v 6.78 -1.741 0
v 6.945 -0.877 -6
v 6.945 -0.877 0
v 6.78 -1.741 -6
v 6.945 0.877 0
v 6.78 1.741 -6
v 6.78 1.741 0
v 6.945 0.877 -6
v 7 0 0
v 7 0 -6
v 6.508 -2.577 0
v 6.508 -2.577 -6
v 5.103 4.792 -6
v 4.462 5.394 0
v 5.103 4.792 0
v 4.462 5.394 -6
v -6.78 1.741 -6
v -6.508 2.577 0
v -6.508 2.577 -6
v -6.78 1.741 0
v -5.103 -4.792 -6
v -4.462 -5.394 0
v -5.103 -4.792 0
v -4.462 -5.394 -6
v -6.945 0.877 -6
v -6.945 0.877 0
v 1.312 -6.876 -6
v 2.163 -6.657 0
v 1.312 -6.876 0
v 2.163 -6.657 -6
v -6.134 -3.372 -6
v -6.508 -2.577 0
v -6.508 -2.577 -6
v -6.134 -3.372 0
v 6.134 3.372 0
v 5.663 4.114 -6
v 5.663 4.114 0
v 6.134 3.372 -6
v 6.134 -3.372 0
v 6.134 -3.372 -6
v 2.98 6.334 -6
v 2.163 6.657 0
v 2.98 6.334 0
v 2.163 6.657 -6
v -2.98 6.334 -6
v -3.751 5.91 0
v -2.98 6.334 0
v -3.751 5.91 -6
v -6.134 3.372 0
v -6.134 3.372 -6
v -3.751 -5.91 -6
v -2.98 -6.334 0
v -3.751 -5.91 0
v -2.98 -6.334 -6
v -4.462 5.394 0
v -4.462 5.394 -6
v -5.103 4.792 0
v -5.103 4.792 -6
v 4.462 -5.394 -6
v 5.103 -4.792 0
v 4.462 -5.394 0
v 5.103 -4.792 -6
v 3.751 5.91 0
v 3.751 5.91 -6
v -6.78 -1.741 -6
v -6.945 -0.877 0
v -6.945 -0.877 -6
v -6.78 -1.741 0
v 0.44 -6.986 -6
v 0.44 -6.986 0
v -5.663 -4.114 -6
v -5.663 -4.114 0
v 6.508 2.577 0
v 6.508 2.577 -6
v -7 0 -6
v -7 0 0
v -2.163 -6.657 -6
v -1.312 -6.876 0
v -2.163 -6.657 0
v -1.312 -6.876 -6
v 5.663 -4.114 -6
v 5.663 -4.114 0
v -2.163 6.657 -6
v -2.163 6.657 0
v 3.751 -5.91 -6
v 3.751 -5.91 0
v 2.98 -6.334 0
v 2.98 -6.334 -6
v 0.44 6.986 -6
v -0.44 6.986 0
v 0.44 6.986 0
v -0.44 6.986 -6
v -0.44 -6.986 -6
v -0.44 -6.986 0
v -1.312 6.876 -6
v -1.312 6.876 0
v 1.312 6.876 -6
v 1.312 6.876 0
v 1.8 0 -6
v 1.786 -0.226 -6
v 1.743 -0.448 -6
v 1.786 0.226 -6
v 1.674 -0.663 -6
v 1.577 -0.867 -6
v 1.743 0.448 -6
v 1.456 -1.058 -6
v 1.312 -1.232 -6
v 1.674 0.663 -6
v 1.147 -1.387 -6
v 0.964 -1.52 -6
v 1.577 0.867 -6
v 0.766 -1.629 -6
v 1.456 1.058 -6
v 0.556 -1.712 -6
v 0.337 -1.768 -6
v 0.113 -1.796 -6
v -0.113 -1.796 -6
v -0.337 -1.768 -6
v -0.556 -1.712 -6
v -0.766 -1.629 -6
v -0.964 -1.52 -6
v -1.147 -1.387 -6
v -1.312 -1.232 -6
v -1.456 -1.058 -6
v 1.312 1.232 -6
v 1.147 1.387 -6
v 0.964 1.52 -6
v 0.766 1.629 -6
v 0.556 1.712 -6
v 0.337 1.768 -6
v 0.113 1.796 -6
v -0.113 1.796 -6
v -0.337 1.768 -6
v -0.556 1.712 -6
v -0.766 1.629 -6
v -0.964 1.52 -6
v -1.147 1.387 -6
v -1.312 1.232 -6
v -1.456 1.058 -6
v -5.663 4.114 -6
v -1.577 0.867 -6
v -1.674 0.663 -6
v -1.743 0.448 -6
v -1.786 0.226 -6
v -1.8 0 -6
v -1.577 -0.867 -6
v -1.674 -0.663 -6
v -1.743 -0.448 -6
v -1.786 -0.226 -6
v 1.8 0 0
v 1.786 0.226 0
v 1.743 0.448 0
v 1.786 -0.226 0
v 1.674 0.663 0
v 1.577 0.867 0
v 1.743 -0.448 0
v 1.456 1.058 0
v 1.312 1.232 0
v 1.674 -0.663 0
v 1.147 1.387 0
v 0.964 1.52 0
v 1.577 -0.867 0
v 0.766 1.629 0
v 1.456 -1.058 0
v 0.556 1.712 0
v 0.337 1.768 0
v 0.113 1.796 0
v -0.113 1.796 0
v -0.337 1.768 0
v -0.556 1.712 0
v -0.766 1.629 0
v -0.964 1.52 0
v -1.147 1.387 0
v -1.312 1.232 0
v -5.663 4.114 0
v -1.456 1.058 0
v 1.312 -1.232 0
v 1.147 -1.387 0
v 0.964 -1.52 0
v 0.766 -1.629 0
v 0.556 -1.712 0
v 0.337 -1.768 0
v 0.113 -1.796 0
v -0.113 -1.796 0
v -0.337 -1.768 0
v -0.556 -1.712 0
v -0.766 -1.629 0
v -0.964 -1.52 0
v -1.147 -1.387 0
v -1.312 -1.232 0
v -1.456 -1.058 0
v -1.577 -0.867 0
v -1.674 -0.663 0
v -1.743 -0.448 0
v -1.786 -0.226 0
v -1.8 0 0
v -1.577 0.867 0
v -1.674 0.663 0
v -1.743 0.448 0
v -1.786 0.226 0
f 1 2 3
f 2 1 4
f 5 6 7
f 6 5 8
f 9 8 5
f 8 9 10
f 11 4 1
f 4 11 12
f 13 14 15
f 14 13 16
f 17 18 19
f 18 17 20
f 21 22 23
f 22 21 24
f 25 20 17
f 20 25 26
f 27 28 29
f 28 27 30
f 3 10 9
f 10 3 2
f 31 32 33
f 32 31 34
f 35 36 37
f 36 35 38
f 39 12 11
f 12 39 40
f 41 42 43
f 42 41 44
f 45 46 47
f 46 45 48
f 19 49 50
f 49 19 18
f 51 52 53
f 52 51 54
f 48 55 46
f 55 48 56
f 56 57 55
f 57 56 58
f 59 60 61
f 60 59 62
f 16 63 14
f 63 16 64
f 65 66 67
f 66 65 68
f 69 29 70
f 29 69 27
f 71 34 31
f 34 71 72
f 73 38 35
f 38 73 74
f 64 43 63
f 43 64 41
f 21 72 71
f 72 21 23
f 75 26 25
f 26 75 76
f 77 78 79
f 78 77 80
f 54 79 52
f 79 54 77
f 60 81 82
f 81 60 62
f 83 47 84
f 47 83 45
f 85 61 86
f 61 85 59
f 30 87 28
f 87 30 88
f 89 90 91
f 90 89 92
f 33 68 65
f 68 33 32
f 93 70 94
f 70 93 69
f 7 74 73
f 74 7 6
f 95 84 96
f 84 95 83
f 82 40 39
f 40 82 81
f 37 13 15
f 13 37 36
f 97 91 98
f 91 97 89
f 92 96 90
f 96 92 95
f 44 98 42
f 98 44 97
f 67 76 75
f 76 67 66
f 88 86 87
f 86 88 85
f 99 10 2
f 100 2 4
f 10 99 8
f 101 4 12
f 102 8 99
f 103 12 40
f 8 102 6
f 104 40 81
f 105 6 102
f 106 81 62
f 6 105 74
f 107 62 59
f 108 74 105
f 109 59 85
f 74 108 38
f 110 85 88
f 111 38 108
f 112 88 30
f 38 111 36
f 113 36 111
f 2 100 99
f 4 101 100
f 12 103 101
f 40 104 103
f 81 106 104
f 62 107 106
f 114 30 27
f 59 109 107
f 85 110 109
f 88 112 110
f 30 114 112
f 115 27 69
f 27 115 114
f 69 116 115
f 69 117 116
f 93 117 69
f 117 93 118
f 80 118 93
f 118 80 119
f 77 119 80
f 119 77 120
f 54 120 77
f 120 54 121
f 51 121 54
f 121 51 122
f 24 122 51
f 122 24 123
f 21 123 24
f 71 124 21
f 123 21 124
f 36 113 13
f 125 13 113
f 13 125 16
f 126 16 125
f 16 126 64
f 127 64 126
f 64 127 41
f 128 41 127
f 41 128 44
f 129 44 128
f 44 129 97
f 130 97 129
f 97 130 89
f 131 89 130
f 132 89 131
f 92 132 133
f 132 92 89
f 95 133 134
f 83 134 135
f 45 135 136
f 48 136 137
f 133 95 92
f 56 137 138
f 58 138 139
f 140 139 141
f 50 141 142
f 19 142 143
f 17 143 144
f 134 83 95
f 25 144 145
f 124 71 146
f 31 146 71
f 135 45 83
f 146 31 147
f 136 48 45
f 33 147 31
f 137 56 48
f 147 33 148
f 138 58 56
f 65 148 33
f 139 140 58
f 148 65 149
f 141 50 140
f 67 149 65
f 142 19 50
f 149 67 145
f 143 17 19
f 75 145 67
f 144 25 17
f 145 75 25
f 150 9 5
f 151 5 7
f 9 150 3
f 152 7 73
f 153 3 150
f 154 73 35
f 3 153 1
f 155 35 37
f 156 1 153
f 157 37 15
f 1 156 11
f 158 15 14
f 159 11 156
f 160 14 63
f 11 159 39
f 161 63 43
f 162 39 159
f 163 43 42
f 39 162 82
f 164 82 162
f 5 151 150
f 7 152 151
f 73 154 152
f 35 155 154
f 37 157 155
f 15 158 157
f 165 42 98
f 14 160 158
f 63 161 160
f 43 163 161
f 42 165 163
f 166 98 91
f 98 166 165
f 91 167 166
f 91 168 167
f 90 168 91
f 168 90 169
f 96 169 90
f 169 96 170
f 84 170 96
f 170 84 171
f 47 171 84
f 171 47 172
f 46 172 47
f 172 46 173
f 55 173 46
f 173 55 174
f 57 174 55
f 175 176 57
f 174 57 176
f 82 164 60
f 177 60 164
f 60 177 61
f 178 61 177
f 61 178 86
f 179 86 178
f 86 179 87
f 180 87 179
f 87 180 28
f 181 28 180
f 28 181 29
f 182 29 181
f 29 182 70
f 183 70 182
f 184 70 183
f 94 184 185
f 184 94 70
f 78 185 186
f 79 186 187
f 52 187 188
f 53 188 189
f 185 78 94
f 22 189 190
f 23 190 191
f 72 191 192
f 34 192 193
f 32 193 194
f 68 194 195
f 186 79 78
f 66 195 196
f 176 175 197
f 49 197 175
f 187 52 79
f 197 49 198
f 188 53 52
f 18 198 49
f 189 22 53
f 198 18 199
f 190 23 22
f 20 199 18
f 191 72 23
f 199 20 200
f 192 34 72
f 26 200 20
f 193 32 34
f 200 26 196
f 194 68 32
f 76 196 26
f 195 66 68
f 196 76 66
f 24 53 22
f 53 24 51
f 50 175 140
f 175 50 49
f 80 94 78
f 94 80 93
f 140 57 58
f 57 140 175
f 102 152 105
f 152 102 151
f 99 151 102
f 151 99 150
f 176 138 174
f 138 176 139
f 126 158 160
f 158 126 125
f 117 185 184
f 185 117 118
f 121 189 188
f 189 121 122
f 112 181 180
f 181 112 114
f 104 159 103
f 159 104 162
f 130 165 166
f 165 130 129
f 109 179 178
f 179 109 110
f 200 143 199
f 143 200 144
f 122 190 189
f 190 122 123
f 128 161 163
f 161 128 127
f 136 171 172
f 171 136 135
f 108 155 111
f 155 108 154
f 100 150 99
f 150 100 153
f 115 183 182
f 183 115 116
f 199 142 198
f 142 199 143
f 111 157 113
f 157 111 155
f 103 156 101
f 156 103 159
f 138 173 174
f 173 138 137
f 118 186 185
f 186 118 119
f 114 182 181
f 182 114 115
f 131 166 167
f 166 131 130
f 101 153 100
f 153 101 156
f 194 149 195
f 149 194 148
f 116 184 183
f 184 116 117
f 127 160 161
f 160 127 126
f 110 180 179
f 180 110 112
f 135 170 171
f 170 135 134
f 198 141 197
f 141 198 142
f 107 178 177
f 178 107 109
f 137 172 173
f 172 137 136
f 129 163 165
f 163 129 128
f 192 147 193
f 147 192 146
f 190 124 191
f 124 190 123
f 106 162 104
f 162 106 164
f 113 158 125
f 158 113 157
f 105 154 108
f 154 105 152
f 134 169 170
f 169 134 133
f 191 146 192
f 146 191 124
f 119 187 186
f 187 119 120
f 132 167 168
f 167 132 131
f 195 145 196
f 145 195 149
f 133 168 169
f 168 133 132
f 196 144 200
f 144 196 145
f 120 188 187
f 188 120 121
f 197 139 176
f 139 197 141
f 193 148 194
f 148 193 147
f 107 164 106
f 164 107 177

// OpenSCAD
$fn = 50;


difference() {
	union() {
		translate(v = [0, 0, -6.0000000000]) {
			cylinder(h = 6, r = 7.0000000000);
		}
	}
	union() {
		#translate(v = [0, 0, -6]) {
			cylinder(h = 6, r = 1.8000000000);
		}
	}
}
